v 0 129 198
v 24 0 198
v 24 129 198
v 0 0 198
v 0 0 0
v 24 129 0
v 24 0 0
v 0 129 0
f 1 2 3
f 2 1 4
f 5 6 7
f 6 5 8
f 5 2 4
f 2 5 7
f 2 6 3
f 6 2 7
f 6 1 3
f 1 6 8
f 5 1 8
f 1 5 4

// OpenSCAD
BFORMAT_W = 129;
BFORMAT_H = 198;
DIVIDER_PAGE_EQUIV = 300;

PAPER_THICK = 0.16;  // estimated

function thick(pages) = pages / 2 * PAPER_THICK;

module book(pages=DIVIDER_PAGE_EQUIV) {
    cube([thick(pages), BFORMAT_W, BFORMAT_H])
        ;
}


book()
    ;
